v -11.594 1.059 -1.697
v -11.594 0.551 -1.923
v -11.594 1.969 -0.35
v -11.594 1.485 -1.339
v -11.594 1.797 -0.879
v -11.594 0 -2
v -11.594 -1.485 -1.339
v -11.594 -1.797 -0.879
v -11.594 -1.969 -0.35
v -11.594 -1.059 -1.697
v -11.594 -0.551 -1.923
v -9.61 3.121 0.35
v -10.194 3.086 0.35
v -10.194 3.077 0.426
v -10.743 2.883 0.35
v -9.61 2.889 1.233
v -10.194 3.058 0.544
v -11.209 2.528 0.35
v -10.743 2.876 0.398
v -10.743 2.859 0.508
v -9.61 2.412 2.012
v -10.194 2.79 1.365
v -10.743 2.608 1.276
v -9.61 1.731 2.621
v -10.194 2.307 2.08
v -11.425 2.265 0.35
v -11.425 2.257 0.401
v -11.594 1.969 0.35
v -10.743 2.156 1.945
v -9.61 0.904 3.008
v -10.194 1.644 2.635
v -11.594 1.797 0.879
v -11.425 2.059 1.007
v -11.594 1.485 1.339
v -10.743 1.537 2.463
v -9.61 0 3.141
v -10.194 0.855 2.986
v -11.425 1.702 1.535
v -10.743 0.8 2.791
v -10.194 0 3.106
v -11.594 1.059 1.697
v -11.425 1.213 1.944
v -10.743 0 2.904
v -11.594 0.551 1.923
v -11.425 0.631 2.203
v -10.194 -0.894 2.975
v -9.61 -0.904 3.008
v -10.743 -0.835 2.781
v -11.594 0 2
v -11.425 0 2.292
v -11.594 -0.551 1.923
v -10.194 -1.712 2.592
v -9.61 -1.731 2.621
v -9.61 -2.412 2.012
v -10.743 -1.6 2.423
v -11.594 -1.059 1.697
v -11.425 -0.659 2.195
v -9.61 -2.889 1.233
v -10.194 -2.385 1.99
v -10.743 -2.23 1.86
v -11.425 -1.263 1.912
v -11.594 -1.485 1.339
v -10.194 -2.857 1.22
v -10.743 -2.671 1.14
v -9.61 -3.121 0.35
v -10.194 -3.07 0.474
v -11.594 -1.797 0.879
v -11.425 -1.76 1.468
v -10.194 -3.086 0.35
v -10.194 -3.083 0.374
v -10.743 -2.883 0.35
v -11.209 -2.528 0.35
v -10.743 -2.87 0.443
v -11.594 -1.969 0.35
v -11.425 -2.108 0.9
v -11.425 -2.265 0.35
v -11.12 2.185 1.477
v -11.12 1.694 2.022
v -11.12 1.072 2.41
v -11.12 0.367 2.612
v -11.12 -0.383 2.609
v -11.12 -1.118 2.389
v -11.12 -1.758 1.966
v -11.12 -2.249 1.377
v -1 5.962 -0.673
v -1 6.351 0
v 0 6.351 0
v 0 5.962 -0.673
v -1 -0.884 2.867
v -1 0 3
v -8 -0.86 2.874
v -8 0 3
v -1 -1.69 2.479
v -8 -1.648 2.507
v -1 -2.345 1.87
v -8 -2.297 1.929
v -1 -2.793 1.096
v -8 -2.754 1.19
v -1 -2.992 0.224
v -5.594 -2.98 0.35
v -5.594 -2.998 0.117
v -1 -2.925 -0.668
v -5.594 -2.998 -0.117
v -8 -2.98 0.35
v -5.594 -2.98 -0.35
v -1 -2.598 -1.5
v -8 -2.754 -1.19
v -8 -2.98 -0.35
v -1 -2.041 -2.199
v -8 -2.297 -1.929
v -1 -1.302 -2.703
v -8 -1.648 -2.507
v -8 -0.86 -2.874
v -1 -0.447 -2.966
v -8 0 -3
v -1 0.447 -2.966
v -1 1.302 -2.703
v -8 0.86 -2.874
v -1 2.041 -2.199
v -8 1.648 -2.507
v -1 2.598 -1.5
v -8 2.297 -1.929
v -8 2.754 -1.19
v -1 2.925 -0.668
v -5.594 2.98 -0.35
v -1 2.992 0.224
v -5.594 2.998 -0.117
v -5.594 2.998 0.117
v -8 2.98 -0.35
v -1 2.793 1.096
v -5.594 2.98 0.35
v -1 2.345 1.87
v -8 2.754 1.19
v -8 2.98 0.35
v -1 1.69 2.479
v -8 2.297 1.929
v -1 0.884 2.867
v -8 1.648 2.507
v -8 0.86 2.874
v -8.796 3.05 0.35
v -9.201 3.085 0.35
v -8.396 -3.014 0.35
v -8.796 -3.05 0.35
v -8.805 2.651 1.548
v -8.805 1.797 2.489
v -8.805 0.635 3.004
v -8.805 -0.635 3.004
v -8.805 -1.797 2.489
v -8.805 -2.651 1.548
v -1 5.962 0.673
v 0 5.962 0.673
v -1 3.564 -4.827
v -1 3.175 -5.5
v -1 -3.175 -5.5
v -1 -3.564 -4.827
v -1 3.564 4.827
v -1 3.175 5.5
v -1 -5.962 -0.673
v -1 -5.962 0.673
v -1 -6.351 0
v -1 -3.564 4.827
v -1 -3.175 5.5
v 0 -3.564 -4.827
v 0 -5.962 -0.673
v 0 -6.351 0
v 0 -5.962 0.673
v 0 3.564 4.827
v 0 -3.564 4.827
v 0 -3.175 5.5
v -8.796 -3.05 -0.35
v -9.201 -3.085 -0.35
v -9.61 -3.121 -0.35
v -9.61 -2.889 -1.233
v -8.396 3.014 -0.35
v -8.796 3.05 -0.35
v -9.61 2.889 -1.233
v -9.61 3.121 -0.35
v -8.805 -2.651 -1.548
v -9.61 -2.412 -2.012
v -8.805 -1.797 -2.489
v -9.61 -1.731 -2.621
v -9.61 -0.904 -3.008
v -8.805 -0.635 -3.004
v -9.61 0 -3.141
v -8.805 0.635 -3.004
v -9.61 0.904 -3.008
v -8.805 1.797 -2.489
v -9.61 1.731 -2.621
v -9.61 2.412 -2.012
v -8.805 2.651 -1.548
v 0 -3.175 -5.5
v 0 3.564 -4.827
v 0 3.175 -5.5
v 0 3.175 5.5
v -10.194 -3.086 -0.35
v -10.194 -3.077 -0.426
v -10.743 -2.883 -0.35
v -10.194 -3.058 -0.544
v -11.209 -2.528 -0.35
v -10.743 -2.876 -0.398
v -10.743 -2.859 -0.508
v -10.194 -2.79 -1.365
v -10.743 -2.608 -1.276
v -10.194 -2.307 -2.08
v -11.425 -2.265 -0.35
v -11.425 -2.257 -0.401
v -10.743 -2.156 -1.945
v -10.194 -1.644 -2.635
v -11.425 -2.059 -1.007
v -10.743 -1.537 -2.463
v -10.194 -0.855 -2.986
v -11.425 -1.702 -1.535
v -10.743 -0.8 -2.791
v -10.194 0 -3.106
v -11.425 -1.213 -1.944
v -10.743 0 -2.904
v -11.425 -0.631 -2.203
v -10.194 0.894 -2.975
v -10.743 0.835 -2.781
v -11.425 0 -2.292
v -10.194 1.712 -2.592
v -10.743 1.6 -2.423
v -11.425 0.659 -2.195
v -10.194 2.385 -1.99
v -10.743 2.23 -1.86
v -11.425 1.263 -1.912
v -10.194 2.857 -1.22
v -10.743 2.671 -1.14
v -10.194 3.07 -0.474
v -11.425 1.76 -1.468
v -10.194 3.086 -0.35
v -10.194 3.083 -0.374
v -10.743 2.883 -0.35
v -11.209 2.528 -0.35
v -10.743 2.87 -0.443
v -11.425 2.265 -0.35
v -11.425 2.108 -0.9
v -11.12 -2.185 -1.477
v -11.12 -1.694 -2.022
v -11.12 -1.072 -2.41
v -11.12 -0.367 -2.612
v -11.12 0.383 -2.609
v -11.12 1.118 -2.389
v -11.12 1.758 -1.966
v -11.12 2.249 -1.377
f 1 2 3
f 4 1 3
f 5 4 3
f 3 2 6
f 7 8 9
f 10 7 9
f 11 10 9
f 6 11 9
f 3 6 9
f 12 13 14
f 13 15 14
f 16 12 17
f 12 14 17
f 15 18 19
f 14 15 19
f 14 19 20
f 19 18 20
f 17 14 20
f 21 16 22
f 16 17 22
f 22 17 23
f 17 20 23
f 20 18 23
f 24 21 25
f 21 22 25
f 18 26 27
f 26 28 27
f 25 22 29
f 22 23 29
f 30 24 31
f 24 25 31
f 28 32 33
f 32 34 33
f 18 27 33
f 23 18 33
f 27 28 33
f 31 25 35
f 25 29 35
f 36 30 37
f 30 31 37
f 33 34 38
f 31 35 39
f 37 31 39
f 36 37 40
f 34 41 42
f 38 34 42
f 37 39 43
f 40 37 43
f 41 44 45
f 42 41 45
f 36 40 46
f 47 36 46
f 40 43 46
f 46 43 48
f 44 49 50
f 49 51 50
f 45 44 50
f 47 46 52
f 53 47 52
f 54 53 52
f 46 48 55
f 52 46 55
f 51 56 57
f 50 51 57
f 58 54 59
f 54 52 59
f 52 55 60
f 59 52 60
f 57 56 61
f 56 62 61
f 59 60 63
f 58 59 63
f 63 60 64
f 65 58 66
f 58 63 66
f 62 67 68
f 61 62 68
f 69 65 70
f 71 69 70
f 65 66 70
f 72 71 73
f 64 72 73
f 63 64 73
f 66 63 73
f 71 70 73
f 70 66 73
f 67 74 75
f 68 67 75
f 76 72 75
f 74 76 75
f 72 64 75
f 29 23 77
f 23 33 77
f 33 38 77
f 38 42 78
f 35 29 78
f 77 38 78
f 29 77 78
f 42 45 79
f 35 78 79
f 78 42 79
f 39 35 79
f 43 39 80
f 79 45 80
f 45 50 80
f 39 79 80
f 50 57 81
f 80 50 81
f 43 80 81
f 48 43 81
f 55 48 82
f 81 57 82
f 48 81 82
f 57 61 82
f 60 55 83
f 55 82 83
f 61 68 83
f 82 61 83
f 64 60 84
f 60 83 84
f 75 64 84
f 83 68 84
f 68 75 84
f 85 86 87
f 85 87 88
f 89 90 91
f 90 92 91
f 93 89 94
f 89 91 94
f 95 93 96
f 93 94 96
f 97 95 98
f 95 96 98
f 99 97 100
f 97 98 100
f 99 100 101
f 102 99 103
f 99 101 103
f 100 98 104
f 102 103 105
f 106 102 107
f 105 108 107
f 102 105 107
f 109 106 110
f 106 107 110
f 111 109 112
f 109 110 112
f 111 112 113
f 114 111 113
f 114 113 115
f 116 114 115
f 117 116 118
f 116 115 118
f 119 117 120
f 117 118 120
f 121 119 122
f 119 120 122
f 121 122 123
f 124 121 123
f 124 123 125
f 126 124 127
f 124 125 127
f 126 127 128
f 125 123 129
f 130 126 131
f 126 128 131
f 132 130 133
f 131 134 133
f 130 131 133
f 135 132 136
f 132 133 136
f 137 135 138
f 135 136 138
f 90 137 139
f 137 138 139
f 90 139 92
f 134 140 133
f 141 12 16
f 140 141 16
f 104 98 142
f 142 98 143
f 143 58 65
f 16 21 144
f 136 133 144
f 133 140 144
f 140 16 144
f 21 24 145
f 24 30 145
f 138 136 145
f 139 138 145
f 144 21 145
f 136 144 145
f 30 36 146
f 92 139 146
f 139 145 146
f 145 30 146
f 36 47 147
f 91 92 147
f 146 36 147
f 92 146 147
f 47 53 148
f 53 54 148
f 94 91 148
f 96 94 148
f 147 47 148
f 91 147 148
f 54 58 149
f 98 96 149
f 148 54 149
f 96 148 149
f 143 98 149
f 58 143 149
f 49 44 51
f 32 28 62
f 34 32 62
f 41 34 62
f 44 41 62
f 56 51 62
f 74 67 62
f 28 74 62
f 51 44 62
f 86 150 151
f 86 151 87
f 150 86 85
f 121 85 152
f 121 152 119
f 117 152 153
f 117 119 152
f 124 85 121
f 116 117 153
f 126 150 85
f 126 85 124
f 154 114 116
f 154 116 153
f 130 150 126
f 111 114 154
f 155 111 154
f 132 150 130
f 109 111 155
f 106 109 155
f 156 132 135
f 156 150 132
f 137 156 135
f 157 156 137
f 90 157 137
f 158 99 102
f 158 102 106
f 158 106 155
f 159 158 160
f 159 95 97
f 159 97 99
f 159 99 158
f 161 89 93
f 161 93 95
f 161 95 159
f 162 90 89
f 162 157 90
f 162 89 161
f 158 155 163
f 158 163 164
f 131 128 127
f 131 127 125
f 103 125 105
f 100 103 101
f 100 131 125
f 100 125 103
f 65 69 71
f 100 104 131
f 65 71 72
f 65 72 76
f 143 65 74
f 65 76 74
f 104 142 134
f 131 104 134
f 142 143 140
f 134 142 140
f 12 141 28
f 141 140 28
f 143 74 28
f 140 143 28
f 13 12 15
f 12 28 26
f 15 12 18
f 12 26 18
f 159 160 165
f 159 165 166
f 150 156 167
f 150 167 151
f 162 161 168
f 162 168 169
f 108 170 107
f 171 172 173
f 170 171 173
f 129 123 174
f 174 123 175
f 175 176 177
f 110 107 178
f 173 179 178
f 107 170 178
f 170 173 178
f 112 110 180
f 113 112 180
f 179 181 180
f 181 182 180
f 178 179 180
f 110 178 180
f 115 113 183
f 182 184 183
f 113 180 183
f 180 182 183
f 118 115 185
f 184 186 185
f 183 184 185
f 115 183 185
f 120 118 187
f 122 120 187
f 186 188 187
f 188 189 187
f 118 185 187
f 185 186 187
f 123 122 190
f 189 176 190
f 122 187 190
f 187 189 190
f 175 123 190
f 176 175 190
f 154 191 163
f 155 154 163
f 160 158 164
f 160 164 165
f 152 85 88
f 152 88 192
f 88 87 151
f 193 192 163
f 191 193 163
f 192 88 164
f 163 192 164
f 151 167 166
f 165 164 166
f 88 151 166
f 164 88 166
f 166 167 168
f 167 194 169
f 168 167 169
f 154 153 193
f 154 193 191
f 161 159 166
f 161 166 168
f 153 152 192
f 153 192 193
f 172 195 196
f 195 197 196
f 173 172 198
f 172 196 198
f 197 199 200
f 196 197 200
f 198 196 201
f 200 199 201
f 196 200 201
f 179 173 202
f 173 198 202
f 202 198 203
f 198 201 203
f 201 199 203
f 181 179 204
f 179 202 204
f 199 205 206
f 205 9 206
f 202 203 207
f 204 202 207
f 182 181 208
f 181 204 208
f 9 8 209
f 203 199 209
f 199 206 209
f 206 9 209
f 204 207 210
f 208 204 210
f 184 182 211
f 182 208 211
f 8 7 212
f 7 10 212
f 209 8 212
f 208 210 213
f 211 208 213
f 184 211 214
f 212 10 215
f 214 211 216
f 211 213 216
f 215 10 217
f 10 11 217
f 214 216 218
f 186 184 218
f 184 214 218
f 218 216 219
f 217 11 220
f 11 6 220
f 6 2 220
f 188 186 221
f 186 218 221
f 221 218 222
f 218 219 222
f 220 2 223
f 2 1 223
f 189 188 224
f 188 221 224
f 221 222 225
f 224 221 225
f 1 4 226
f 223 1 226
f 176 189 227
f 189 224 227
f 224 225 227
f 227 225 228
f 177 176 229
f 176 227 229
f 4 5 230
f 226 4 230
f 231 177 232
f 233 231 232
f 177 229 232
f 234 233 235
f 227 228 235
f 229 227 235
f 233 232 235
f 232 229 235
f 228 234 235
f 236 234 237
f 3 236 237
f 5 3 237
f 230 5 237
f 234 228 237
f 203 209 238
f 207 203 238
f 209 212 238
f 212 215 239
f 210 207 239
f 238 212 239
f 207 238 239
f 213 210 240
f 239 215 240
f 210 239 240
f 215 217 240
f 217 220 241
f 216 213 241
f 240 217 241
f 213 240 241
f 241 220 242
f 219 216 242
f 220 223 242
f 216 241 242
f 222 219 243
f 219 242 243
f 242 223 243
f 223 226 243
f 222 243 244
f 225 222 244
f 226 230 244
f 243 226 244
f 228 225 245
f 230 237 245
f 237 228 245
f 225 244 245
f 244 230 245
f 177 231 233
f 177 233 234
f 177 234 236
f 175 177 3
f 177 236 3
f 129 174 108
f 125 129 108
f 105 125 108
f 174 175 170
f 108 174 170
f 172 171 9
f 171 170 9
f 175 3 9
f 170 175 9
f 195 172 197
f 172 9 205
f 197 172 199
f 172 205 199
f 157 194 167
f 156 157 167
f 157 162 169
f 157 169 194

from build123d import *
from build123d import SkipClean  # not in build123d's __all__

# Parameters (mm, degrees)
F3_DEPTH = 6
F4_W     = 13.7017059222
F4_H     = 13
F4_R     = 3
F5_DEPTH = 25
F6_DEPTH = 1


with BuildPart() as f1:
    # F0 (on Front) → F1 (revolve)
    with BuildSketch(Plane.XZ):
        with BuildLine():
            Line((-11.5940445242, 0), (0, 0))
            Line((0, 0), (0, 6))
            Line((0, 6), (-1, 6))
            Line((-1, 6), (-1, 3))
            Line((-1, 3), (-8, 3))
            Line((-8, 3), (-9.6100640914, 3.1408623555))
            ThreePointArc((-9.6100640914, 3.1408623555), (-10.7813661664, 2.8822577685), (-11.5940445242, 2))
            Line((-11.5940445242, 2), (-11.5940445242, 0))
        make_face()
    revolve(axis=Axis((-5.7970222621, 0, 0), (1, 0, 0)))

    # F2 (on face) → F3 (cut)
    with BuildSketch(Plane(origin=(-11.5940445242, 0, 0), x_dir=(0, -1, 0), z_dir=(-1, 0, 0))):
        with BuildLine():
            ThreePointArc((-1.9691368668, -0.35), (-2, 0), (-1.9691368668, 0.35))
            Line((-1.9691368668, 0.35), (-4, 0.35))
            Line((-4, 0.35), (-4, -0.35))
            Line((-4, -0.35), (-2.9795133831, -0.35))
            Line((-2.9795133831, -0.35), (-1.9691368668, -0.35))
        make_face()
        with BuildLine():
            Line((1.9691368668, 0.35), (0.25, 0.35))
            Line((0.25, 0.35), (0.25, 0))
            Line((0.25, 0), (0.25, -0.35))
            Line((0.25, -0.35), (1.9691368668, -0.35))
            ThreePointArc((1.9691368668, -0.35), (1.9922692757, -0.1756790632), (2, 0))
            ThreePointArc((2, 0), (1.9922692757, 0.1756790632), (1.9691368668, 0.35))
        make_face()
        with BuildLine():
            Line((-0.25, 0), (-0.25, 0.35))
            Line((-0.25, 0.35), (-1.9691368668, 0.35))
            ThreePointArc((-1.9691368668, 0.35), (-2, 0), (-1.9691368668, -0.35))
            Line((-1.9691368668, -0.35), (-0.25, -0.35))
            Line((-0.25, -0.35), (-0.25, 0))
        make_face()
        Polygon((0.25, 0), (0.25, 0.35), (-0.25, 0.35), (-0.25, 0), (-0.25, -0.35), (0.25, -0.35), align=None)
        with BuildLine():
            Line((4, 0.35), (1.9691368668, 0.35))
            ThreePointArc((1.9691368668, 0.35), (1.9922692757, 0.1756790632), (2, 0))
            ThreePointArc((2, 0), (1.9922692757, -0.1756790632), (1.9691368668, -0.35))
            Line((1.9691368668, -0.35), (2.9795133831, -0.35))
            Line((2.9795133831, -0.35), (4, -0.35))
            Line((4, -0.35), (4, 0.35))
        make_face()
    extrude(amount=-F3_DEPTH, mode=Mode.SUBTRACT)

    # F4 (on face) → F5 (cut)
    with BuildSketch(Plane(origin=(-1, 0, 0), x_dir=(0, -1, 0), z_dir=(-1, 0, 0))):
        Rectangle(F4_W, F4_H)
        Polygon((-6.3508529611, 0), (-3.1754264805, 5.5), (3.1754264805, 5.5), (6.3508529611, 0), (3.1754264805, -5.5), (-3.1754264805, -5.5), align=None, mode=Mode.SUBTRACT)
        with BuildLine():
            Line((2.3979157617, 5.5), (-2.3979157617, 5.5))
            ThreePointArc((-2.3979157617, 5.5), (-3, 5.1961524227), (-3.56418184, 4.8266559657))
            Line((-3.56418184, 4.8266559657), (-5.9620976016, 0.6733440343))
            ThreePointArc((-5.9620976016, 0.6733440343), (-6, 0), (-5.9620976016, -0.6733440343))
            Line((-5.9620976016, -0.6733440343), (-3.56418184, -4.8266559657))
            ThreePointArc((-3.56418184, -4.8266559657), (-3, -5.1961524227), (-2.3979157617, -5.5))
            Line((-2.3979157617, -5.5), (2.3979157617, -5.5))
            ThreePointArc((2.3979157617, -5.5), (3, -5.1961524227), (3.56418184, -4.8266559657))
            Line((3.56418184, -4.8266559657), (5.9620976016, -0.6733440343))
            ThreePointArc((5.9620976016, -0.6733440343), (5.9905169063, -0.3372049749), (6, 0))
            ThreePointArc((6, 0), (5.9905169063, 0.3372049749), (5.9620976016, 0.6733440343))
            Line((5.9620976016, 0.6733440343), (3.56418184, 4.8266559657))
            ThreePointArc((3.56418184, 4.8266559657), (3, 5.1961524227), (2.3979157617, 5.5))
        make_face()
        Circle(F4_R, mode=Mode.SUBTRACT)
    with SkipClean():  # cleaning this boolean's faces spoils the solid; the shape is the same uncleaned
        extrude(amount=-F5_DEPTH, mode=Mode.SUBTRACT)

    # F4 (on face) → F6 (join)
    with BuildSketch(Plane(origin=(-1, 0, 0), x_dir=(0, -1, 0), z_dir=(-1, 0, 0))):
        with BuildLine():
            Line((2.3979157617, 5.5), (-2.3979157617, 5.5))
            ThreePointArc((-2.3979157617, 5.5), (-3, 5.1961524227), (-3.56418184, 4.8266559657))
            Line((-3.56418184, 4.8266559657), (-5.9620976016, 0.6733440343))
            ThreePointArc((-5.9620976016, 0.6733440343), (-6, 0), (-5.9620976016, -0.6733440343))
            Line((-5.9620976016, -0.6733440343), (-3.56418184, -4.8266559657))
            ThreePointArc((-3.56418184, -4.8266559657), (-3, -5.1961524227), (-2.3979157617, -5.5))
            Line((-2.3979157617, -5.5), (2.3979157617, -5.5))
            ThreePointArc((2.3979157617, -5.5), (3, -5.1961524227), (3.56418184, -4.8266559657))
            Line((3.56418184, -4.8266559657), (5.9620976016, -0.6733440343))
            ThreePointArc((5.9620976016, -0.6733440343), (5.9905169063, -0.3372049749), (6, 0))
            ThreePointArc((6, 0), (5.9905169063, 0.3372049749), (5.9620976016, 0.6733440343))
            Line((5.9620976016, 0.6733440343), (3.56418184, 4.8266559657))
            ThreePointArc((3.56418184, 4.8266559657), (3, 5.1961524227), (2.3979157617, 5.5))
        make_face()
        Circle(F4_R, mode=Mode.SUBTRACT)
        with BuildLine():
            Line((-2.3979157617, 5.5), (-3.1754264805, 5.5))
            Line((-3.1754264805, 5.5), (-3.56418184, 4.8266559657))
            ThreePointArc((-3.56418184, 4.8266559657), (-3, 5.1961524227), (-2.3979157617, 5.5))
        make_face()
        with BuildLine():
            Line((3.1754264805, 5.5), (2.3979157617, 5.5))
            ThreePointArc((2.3979157617, 5.5), (3, 5.1961524227), (3.56418184, 4.8266559657))
            Line((3.56418184, 4.8266559657), (3.1754264805, 5.5))
        make_face()
        with BuildLine():
            Line((6.3508529611, 0), (5.9620976016, 0.6733440343))
            ThreePointArc((5.9620976016, 0.6733440343), (5.9905169063, 0.3372049749), (6, 0))
            ThreePointArc((6, 0), (5.9905169063, -0.3372049749), (5.9620976016, -0.6733440343))
            Line((5.9620976016, -0.6733440343), (6.3508529611, 0))
        make_face()
        with BuildLine():
            ThreePointArc((3.56418184, -4.8266559657), (3, -5.1961524227), (2.3979157617, -5.5))
            Line((2.3979157617, -5.5), (3.1754264805, -5.5))
            Line((3.1754264805, -5.5), (3.56418184, -4.8266559657))
        make_face()
        with BuildLine():
            ThreePointArc((-2.3979157617, -5.5), (-3, -5.1961524227), (-3.56418184, -4.8266559657))
            Line((-3.56418184, -4.8266559657), (-3.1754264805, -5.5))
            Line((-3.1754264805, -5.5), (-2.3979157617, -5.5))
        make_face()
        with BuildLine():
            ThreePointArc((-5.9620976016, -0.6733440343), (-6, 0), (-5.9620976016, 0.6733440343))
            Line((-5.9620976016, 0.6733440343), (-6.3508529611, 0))
            Line((-6.3508529611, 0), (-5.9620976016, -0.6733440343))
        make_face()
    extrude(amount=-F6_DEPTH)


solid = f1.part
